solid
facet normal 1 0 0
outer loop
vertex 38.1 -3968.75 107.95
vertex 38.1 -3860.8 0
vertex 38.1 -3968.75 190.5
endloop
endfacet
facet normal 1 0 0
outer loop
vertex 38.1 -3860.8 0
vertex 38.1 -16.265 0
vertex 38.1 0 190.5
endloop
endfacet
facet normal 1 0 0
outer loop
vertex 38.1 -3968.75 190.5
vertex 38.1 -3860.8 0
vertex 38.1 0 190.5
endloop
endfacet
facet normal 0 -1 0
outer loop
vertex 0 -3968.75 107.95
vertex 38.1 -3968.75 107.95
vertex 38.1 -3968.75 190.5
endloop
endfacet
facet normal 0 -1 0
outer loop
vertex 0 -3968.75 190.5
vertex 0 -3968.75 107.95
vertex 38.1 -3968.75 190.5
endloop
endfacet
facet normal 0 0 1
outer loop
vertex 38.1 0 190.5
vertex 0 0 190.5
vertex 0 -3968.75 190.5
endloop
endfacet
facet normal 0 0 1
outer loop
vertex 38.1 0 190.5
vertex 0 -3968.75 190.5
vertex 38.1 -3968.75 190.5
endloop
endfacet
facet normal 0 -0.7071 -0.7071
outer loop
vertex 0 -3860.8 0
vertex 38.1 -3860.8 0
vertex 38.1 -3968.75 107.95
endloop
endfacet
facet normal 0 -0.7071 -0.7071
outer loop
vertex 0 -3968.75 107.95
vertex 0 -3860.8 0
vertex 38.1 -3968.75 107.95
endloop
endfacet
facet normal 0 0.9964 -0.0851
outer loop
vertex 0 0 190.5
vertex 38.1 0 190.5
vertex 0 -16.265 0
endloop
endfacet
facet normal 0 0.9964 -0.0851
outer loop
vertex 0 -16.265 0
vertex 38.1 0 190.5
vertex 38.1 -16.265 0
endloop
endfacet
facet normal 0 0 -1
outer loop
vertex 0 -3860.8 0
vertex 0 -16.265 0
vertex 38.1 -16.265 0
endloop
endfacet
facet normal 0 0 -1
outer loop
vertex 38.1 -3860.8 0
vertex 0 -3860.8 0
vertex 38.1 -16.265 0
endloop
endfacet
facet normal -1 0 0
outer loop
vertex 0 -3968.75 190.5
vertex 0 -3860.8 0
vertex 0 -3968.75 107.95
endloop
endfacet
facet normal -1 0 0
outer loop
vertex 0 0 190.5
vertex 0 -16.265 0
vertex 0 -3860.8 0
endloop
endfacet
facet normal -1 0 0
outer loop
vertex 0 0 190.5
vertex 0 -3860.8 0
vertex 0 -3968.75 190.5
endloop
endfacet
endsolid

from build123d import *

# Parameters (mm, degrees)
F0_W     = 38.1
F0_H     = 190.5
F1_DEPTH = 4267.2
F3_DEPTH = 38.101
F5_DEPTH = 38.101


with BuildPart() as f1:
    # F0 (on Front) → F1 (new body)
    with BuildSketch(Plane.XZ):
        with Locations((19.05, 95.25)):
            Rectangle(F0_W, F0_H)
    extrude(amount=F1_DEPTH)

    # F2 (on face) → F3 (cut, through all)
    with BuildSketch(Plane.YZ.offset(38.1)):
        Polygon((0, 0), (0, 190.5), (-16.264627, 0), align=None)
    extrude(amount=-F3_DEPTH, mode=Mode.SUBTRACT)

    # F4 (on face) → F5 (cut, through all)
    with BuildSketch(Plane.YZ.offset(38.1)):
        Polygon((-3968.75, 107.95), (-3968.75, 190.5), (-4267.2, 190.5), (-4267.2, 0), (-3860.8, 0), align=None)
    extrude(amount=-F5_DEPTH, mode=Mode.SUBTRACT)


solid = f1.part
